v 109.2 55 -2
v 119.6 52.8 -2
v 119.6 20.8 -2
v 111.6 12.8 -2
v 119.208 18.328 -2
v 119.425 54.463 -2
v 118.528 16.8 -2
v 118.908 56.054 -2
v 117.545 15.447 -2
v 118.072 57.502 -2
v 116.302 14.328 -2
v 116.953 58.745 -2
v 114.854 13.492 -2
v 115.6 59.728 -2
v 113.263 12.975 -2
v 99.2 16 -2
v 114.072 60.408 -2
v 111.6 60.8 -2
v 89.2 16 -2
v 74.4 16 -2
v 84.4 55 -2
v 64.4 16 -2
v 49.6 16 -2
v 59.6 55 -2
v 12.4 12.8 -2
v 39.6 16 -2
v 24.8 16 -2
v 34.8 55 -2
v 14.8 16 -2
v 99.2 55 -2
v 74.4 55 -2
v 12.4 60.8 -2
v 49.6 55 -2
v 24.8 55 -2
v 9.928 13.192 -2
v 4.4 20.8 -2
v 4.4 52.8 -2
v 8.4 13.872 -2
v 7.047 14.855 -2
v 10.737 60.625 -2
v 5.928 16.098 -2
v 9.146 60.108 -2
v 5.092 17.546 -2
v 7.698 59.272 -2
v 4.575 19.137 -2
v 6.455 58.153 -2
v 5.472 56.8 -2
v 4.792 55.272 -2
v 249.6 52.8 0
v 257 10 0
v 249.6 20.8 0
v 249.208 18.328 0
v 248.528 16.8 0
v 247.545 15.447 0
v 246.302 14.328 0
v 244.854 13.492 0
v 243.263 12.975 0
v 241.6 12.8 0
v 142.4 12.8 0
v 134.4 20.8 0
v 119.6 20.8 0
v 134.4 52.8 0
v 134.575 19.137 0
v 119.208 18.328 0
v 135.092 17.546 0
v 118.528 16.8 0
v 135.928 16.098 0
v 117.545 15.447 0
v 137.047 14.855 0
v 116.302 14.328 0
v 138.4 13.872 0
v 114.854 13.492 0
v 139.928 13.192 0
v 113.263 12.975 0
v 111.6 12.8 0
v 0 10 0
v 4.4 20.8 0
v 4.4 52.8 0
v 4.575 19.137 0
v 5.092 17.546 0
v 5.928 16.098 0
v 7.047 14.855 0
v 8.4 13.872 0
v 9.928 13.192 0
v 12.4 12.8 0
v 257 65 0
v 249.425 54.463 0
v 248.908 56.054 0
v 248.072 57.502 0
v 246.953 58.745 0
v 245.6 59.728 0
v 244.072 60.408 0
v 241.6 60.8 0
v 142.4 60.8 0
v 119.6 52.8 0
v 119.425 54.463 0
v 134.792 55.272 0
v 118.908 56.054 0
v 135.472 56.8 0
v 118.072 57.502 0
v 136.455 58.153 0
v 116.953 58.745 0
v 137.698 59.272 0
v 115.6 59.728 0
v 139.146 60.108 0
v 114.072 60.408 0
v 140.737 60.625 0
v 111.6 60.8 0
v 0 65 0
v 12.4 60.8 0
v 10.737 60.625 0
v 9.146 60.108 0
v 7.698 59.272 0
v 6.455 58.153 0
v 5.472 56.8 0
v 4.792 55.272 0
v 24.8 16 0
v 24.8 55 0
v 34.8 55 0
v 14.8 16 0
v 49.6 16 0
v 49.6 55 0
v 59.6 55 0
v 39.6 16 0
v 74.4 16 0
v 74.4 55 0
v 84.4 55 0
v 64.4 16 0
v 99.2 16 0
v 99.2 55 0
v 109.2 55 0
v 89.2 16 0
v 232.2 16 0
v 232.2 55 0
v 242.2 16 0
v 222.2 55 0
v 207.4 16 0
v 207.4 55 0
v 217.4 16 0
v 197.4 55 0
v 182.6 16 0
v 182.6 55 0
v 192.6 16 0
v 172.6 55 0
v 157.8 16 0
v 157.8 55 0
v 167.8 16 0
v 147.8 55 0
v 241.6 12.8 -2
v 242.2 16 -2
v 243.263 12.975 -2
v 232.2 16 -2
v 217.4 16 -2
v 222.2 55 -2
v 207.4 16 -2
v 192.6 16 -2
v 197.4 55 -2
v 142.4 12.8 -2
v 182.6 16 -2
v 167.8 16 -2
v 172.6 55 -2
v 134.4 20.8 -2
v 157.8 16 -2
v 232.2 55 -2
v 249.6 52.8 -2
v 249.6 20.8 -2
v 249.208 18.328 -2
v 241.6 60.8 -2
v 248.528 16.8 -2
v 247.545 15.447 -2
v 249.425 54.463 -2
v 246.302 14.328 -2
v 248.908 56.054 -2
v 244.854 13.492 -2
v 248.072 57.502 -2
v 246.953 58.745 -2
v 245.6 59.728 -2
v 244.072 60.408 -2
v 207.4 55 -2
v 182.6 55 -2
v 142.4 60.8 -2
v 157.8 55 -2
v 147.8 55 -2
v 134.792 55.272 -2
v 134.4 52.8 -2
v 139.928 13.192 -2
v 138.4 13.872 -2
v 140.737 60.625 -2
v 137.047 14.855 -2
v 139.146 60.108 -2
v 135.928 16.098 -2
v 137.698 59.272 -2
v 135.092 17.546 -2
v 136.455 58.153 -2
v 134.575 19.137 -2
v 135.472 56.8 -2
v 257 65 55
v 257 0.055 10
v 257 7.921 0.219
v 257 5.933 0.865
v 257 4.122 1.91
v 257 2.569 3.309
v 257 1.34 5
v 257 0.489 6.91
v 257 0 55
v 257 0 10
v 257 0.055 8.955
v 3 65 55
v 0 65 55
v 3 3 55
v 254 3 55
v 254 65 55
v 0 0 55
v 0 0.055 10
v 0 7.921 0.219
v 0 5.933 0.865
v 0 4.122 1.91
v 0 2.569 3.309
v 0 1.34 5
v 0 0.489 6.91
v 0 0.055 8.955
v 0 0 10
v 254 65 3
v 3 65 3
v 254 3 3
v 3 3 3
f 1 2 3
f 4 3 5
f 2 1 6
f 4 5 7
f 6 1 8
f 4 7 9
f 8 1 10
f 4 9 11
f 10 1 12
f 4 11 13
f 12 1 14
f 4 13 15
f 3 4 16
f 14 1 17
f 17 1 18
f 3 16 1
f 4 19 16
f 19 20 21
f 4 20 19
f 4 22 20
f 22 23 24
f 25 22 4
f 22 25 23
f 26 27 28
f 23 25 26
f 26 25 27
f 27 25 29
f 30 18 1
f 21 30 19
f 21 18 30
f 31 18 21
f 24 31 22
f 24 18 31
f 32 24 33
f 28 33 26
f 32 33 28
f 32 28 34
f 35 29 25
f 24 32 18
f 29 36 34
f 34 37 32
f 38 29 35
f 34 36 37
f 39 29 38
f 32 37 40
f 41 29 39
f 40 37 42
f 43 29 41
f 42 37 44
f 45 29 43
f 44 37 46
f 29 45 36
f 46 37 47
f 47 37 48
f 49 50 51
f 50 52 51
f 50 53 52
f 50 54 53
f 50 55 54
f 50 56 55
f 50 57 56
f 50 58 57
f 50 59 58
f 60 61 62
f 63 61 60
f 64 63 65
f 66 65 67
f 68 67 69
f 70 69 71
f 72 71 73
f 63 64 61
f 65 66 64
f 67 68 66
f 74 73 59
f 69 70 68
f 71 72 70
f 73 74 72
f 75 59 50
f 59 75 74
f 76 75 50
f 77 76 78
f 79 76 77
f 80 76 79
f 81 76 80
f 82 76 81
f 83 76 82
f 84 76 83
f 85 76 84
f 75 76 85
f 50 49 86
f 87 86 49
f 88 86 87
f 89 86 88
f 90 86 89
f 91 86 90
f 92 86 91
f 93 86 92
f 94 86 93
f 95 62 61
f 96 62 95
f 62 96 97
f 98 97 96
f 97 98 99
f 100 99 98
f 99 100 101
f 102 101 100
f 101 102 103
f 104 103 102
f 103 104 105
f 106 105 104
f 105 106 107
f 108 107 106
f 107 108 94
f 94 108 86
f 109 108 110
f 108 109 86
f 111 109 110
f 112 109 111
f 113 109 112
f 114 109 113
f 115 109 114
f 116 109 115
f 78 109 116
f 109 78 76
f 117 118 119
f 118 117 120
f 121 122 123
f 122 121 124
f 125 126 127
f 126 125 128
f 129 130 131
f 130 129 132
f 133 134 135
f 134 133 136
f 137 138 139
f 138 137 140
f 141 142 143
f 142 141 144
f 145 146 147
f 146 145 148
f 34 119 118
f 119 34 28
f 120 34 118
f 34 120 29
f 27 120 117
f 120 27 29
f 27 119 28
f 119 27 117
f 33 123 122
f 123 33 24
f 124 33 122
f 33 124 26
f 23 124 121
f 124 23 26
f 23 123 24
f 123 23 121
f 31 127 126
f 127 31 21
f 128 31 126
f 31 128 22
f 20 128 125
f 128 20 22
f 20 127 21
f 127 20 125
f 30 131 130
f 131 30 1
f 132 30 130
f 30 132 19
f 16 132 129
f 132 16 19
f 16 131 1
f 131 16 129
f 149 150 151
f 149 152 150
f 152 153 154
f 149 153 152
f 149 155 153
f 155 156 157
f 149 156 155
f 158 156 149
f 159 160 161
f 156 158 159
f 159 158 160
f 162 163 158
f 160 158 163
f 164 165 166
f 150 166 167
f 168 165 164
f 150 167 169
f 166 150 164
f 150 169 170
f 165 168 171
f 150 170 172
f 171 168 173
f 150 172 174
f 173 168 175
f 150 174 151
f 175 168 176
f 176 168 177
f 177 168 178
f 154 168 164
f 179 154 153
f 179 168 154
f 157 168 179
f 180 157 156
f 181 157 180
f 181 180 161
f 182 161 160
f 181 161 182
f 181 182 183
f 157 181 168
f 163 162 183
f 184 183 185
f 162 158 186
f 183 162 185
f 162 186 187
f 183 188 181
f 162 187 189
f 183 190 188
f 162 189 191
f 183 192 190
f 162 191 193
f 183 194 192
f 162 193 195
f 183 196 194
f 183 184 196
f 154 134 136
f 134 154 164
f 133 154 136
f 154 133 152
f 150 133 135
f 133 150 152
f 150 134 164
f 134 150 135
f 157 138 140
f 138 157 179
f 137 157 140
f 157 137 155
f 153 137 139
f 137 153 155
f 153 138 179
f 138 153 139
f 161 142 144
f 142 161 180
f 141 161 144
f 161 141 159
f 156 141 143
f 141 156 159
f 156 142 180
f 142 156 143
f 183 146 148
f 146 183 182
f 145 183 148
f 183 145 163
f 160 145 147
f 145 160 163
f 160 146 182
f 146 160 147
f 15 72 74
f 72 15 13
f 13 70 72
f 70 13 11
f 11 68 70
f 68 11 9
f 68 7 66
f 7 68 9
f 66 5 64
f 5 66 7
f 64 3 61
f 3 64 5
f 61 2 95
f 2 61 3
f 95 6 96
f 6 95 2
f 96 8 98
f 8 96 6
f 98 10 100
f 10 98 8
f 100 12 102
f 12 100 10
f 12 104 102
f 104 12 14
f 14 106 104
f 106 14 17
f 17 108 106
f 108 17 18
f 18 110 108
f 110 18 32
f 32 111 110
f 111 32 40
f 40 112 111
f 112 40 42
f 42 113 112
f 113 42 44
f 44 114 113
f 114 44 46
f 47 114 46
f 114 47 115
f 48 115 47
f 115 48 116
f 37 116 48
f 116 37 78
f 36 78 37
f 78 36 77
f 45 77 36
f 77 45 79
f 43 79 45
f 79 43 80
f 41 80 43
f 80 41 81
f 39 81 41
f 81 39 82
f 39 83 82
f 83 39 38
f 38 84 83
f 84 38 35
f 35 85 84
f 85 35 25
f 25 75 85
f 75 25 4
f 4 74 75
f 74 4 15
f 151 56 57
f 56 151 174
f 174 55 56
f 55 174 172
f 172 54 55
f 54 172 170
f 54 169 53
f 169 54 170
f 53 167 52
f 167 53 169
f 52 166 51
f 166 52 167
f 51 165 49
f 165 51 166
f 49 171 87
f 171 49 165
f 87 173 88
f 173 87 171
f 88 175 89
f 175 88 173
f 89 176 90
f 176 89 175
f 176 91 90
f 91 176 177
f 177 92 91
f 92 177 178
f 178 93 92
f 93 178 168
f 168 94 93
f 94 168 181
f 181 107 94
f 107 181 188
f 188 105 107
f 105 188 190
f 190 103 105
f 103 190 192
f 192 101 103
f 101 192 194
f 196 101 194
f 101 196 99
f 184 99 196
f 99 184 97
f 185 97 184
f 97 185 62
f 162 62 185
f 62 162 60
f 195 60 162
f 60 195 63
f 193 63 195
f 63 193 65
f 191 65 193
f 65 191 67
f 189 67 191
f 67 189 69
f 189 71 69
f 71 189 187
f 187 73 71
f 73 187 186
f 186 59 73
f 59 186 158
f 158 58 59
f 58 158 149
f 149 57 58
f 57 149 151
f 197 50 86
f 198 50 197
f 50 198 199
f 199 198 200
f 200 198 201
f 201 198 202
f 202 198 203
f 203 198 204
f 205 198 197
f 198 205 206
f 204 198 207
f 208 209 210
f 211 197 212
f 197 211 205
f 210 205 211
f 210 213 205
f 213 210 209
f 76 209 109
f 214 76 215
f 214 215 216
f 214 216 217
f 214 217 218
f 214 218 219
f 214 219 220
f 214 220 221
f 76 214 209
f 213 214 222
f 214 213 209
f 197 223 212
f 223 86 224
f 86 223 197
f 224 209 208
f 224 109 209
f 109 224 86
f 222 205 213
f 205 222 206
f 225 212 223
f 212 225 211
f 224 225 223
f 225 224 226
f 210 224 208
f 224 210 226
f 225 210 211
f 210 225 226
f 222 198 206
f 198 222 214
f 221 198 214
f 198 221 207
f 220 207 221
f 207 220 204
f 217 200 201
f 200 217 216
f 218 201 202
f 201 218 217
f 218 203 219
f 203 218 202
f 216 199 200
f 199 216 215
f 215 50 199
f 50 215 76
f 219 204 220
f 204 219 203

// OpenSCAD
encheight = 124; // measured (was 122.5)
hookheight = 3; // we only have 3mm between enclosures
backthick = 3;
tofan = 55; // distance from edge to 80mm fan
fanheight = 25;
tobrace = 40; // measured distance to FlexBay brace
frontwidth = fanheight + tobrace;
totalheight = encheight * 2 + hookheight * 3;
curve = 10;

module flat(){
  polygon([[encheight + hookheight, 16],
         [encheight + hookheight, 16 + tobrace],
         [hookheight, 16 + tobrace],
         [hookheight, 16]]);
}

difference(){
  union(){
    cube([totalheight, frontwidth, tofan]);
    translate([0, 0, -2]){
      difference(){
        linear_extrude(2){
          minkowski(){
            translate([10, 8, -20]){
              scale([0.8, 0.8, 1])
              offset(10){
                flat();
              }
            }
          }
          minkowski(){
            translate([140, 8, -20]){
              scale([0.8, 0.8, 1])
              offset(10){
                flat();
              }
            }
          }
        }
        union(){
          linear_extrude(2){
            for(ul = [1 : 4]){
              polygon([[ul * encheight / 5 - 10, 16],
                      [ul * encheight / 5, frontwidth - 10],
                      [ul * encheight / 5 + 10, frontwidth - 10],
                      [ul * encheight / 5, 16]]);
            }
          }
          linear_extrude(2){
            for(ul = [1 : 4]){
              polygon([[totalheight - ul * encheight / 5 + 10, 16],
                       [totalheight - ul * encheight / 5, frontwidth - 10],
                       [totalheight - ul * encheight / 5 - 10, frontwidth - 10],
                       [totalheight - ul * encheight / 5, 16]]);
            }
          }
        }
      }
    }
  }
  union(){
    translate([hookheight, backthick, backthick]){
      cube([totalheight - hookheight * 2, frontwidth, tofan]);
    }
    cube([totalheight, curve, curve]);
  }
}

// round the corner
difference(){
  translate([0, curve, curve]){
    rotate([0, 90, 0]){
      cylinder(totalheight, curve, curve);
    }
  }
  translate([hookheight, hookheight, hookheight]){
    cube([totalheight - hookheight * 2, curve * 2, curve * 2]);
  }
}
